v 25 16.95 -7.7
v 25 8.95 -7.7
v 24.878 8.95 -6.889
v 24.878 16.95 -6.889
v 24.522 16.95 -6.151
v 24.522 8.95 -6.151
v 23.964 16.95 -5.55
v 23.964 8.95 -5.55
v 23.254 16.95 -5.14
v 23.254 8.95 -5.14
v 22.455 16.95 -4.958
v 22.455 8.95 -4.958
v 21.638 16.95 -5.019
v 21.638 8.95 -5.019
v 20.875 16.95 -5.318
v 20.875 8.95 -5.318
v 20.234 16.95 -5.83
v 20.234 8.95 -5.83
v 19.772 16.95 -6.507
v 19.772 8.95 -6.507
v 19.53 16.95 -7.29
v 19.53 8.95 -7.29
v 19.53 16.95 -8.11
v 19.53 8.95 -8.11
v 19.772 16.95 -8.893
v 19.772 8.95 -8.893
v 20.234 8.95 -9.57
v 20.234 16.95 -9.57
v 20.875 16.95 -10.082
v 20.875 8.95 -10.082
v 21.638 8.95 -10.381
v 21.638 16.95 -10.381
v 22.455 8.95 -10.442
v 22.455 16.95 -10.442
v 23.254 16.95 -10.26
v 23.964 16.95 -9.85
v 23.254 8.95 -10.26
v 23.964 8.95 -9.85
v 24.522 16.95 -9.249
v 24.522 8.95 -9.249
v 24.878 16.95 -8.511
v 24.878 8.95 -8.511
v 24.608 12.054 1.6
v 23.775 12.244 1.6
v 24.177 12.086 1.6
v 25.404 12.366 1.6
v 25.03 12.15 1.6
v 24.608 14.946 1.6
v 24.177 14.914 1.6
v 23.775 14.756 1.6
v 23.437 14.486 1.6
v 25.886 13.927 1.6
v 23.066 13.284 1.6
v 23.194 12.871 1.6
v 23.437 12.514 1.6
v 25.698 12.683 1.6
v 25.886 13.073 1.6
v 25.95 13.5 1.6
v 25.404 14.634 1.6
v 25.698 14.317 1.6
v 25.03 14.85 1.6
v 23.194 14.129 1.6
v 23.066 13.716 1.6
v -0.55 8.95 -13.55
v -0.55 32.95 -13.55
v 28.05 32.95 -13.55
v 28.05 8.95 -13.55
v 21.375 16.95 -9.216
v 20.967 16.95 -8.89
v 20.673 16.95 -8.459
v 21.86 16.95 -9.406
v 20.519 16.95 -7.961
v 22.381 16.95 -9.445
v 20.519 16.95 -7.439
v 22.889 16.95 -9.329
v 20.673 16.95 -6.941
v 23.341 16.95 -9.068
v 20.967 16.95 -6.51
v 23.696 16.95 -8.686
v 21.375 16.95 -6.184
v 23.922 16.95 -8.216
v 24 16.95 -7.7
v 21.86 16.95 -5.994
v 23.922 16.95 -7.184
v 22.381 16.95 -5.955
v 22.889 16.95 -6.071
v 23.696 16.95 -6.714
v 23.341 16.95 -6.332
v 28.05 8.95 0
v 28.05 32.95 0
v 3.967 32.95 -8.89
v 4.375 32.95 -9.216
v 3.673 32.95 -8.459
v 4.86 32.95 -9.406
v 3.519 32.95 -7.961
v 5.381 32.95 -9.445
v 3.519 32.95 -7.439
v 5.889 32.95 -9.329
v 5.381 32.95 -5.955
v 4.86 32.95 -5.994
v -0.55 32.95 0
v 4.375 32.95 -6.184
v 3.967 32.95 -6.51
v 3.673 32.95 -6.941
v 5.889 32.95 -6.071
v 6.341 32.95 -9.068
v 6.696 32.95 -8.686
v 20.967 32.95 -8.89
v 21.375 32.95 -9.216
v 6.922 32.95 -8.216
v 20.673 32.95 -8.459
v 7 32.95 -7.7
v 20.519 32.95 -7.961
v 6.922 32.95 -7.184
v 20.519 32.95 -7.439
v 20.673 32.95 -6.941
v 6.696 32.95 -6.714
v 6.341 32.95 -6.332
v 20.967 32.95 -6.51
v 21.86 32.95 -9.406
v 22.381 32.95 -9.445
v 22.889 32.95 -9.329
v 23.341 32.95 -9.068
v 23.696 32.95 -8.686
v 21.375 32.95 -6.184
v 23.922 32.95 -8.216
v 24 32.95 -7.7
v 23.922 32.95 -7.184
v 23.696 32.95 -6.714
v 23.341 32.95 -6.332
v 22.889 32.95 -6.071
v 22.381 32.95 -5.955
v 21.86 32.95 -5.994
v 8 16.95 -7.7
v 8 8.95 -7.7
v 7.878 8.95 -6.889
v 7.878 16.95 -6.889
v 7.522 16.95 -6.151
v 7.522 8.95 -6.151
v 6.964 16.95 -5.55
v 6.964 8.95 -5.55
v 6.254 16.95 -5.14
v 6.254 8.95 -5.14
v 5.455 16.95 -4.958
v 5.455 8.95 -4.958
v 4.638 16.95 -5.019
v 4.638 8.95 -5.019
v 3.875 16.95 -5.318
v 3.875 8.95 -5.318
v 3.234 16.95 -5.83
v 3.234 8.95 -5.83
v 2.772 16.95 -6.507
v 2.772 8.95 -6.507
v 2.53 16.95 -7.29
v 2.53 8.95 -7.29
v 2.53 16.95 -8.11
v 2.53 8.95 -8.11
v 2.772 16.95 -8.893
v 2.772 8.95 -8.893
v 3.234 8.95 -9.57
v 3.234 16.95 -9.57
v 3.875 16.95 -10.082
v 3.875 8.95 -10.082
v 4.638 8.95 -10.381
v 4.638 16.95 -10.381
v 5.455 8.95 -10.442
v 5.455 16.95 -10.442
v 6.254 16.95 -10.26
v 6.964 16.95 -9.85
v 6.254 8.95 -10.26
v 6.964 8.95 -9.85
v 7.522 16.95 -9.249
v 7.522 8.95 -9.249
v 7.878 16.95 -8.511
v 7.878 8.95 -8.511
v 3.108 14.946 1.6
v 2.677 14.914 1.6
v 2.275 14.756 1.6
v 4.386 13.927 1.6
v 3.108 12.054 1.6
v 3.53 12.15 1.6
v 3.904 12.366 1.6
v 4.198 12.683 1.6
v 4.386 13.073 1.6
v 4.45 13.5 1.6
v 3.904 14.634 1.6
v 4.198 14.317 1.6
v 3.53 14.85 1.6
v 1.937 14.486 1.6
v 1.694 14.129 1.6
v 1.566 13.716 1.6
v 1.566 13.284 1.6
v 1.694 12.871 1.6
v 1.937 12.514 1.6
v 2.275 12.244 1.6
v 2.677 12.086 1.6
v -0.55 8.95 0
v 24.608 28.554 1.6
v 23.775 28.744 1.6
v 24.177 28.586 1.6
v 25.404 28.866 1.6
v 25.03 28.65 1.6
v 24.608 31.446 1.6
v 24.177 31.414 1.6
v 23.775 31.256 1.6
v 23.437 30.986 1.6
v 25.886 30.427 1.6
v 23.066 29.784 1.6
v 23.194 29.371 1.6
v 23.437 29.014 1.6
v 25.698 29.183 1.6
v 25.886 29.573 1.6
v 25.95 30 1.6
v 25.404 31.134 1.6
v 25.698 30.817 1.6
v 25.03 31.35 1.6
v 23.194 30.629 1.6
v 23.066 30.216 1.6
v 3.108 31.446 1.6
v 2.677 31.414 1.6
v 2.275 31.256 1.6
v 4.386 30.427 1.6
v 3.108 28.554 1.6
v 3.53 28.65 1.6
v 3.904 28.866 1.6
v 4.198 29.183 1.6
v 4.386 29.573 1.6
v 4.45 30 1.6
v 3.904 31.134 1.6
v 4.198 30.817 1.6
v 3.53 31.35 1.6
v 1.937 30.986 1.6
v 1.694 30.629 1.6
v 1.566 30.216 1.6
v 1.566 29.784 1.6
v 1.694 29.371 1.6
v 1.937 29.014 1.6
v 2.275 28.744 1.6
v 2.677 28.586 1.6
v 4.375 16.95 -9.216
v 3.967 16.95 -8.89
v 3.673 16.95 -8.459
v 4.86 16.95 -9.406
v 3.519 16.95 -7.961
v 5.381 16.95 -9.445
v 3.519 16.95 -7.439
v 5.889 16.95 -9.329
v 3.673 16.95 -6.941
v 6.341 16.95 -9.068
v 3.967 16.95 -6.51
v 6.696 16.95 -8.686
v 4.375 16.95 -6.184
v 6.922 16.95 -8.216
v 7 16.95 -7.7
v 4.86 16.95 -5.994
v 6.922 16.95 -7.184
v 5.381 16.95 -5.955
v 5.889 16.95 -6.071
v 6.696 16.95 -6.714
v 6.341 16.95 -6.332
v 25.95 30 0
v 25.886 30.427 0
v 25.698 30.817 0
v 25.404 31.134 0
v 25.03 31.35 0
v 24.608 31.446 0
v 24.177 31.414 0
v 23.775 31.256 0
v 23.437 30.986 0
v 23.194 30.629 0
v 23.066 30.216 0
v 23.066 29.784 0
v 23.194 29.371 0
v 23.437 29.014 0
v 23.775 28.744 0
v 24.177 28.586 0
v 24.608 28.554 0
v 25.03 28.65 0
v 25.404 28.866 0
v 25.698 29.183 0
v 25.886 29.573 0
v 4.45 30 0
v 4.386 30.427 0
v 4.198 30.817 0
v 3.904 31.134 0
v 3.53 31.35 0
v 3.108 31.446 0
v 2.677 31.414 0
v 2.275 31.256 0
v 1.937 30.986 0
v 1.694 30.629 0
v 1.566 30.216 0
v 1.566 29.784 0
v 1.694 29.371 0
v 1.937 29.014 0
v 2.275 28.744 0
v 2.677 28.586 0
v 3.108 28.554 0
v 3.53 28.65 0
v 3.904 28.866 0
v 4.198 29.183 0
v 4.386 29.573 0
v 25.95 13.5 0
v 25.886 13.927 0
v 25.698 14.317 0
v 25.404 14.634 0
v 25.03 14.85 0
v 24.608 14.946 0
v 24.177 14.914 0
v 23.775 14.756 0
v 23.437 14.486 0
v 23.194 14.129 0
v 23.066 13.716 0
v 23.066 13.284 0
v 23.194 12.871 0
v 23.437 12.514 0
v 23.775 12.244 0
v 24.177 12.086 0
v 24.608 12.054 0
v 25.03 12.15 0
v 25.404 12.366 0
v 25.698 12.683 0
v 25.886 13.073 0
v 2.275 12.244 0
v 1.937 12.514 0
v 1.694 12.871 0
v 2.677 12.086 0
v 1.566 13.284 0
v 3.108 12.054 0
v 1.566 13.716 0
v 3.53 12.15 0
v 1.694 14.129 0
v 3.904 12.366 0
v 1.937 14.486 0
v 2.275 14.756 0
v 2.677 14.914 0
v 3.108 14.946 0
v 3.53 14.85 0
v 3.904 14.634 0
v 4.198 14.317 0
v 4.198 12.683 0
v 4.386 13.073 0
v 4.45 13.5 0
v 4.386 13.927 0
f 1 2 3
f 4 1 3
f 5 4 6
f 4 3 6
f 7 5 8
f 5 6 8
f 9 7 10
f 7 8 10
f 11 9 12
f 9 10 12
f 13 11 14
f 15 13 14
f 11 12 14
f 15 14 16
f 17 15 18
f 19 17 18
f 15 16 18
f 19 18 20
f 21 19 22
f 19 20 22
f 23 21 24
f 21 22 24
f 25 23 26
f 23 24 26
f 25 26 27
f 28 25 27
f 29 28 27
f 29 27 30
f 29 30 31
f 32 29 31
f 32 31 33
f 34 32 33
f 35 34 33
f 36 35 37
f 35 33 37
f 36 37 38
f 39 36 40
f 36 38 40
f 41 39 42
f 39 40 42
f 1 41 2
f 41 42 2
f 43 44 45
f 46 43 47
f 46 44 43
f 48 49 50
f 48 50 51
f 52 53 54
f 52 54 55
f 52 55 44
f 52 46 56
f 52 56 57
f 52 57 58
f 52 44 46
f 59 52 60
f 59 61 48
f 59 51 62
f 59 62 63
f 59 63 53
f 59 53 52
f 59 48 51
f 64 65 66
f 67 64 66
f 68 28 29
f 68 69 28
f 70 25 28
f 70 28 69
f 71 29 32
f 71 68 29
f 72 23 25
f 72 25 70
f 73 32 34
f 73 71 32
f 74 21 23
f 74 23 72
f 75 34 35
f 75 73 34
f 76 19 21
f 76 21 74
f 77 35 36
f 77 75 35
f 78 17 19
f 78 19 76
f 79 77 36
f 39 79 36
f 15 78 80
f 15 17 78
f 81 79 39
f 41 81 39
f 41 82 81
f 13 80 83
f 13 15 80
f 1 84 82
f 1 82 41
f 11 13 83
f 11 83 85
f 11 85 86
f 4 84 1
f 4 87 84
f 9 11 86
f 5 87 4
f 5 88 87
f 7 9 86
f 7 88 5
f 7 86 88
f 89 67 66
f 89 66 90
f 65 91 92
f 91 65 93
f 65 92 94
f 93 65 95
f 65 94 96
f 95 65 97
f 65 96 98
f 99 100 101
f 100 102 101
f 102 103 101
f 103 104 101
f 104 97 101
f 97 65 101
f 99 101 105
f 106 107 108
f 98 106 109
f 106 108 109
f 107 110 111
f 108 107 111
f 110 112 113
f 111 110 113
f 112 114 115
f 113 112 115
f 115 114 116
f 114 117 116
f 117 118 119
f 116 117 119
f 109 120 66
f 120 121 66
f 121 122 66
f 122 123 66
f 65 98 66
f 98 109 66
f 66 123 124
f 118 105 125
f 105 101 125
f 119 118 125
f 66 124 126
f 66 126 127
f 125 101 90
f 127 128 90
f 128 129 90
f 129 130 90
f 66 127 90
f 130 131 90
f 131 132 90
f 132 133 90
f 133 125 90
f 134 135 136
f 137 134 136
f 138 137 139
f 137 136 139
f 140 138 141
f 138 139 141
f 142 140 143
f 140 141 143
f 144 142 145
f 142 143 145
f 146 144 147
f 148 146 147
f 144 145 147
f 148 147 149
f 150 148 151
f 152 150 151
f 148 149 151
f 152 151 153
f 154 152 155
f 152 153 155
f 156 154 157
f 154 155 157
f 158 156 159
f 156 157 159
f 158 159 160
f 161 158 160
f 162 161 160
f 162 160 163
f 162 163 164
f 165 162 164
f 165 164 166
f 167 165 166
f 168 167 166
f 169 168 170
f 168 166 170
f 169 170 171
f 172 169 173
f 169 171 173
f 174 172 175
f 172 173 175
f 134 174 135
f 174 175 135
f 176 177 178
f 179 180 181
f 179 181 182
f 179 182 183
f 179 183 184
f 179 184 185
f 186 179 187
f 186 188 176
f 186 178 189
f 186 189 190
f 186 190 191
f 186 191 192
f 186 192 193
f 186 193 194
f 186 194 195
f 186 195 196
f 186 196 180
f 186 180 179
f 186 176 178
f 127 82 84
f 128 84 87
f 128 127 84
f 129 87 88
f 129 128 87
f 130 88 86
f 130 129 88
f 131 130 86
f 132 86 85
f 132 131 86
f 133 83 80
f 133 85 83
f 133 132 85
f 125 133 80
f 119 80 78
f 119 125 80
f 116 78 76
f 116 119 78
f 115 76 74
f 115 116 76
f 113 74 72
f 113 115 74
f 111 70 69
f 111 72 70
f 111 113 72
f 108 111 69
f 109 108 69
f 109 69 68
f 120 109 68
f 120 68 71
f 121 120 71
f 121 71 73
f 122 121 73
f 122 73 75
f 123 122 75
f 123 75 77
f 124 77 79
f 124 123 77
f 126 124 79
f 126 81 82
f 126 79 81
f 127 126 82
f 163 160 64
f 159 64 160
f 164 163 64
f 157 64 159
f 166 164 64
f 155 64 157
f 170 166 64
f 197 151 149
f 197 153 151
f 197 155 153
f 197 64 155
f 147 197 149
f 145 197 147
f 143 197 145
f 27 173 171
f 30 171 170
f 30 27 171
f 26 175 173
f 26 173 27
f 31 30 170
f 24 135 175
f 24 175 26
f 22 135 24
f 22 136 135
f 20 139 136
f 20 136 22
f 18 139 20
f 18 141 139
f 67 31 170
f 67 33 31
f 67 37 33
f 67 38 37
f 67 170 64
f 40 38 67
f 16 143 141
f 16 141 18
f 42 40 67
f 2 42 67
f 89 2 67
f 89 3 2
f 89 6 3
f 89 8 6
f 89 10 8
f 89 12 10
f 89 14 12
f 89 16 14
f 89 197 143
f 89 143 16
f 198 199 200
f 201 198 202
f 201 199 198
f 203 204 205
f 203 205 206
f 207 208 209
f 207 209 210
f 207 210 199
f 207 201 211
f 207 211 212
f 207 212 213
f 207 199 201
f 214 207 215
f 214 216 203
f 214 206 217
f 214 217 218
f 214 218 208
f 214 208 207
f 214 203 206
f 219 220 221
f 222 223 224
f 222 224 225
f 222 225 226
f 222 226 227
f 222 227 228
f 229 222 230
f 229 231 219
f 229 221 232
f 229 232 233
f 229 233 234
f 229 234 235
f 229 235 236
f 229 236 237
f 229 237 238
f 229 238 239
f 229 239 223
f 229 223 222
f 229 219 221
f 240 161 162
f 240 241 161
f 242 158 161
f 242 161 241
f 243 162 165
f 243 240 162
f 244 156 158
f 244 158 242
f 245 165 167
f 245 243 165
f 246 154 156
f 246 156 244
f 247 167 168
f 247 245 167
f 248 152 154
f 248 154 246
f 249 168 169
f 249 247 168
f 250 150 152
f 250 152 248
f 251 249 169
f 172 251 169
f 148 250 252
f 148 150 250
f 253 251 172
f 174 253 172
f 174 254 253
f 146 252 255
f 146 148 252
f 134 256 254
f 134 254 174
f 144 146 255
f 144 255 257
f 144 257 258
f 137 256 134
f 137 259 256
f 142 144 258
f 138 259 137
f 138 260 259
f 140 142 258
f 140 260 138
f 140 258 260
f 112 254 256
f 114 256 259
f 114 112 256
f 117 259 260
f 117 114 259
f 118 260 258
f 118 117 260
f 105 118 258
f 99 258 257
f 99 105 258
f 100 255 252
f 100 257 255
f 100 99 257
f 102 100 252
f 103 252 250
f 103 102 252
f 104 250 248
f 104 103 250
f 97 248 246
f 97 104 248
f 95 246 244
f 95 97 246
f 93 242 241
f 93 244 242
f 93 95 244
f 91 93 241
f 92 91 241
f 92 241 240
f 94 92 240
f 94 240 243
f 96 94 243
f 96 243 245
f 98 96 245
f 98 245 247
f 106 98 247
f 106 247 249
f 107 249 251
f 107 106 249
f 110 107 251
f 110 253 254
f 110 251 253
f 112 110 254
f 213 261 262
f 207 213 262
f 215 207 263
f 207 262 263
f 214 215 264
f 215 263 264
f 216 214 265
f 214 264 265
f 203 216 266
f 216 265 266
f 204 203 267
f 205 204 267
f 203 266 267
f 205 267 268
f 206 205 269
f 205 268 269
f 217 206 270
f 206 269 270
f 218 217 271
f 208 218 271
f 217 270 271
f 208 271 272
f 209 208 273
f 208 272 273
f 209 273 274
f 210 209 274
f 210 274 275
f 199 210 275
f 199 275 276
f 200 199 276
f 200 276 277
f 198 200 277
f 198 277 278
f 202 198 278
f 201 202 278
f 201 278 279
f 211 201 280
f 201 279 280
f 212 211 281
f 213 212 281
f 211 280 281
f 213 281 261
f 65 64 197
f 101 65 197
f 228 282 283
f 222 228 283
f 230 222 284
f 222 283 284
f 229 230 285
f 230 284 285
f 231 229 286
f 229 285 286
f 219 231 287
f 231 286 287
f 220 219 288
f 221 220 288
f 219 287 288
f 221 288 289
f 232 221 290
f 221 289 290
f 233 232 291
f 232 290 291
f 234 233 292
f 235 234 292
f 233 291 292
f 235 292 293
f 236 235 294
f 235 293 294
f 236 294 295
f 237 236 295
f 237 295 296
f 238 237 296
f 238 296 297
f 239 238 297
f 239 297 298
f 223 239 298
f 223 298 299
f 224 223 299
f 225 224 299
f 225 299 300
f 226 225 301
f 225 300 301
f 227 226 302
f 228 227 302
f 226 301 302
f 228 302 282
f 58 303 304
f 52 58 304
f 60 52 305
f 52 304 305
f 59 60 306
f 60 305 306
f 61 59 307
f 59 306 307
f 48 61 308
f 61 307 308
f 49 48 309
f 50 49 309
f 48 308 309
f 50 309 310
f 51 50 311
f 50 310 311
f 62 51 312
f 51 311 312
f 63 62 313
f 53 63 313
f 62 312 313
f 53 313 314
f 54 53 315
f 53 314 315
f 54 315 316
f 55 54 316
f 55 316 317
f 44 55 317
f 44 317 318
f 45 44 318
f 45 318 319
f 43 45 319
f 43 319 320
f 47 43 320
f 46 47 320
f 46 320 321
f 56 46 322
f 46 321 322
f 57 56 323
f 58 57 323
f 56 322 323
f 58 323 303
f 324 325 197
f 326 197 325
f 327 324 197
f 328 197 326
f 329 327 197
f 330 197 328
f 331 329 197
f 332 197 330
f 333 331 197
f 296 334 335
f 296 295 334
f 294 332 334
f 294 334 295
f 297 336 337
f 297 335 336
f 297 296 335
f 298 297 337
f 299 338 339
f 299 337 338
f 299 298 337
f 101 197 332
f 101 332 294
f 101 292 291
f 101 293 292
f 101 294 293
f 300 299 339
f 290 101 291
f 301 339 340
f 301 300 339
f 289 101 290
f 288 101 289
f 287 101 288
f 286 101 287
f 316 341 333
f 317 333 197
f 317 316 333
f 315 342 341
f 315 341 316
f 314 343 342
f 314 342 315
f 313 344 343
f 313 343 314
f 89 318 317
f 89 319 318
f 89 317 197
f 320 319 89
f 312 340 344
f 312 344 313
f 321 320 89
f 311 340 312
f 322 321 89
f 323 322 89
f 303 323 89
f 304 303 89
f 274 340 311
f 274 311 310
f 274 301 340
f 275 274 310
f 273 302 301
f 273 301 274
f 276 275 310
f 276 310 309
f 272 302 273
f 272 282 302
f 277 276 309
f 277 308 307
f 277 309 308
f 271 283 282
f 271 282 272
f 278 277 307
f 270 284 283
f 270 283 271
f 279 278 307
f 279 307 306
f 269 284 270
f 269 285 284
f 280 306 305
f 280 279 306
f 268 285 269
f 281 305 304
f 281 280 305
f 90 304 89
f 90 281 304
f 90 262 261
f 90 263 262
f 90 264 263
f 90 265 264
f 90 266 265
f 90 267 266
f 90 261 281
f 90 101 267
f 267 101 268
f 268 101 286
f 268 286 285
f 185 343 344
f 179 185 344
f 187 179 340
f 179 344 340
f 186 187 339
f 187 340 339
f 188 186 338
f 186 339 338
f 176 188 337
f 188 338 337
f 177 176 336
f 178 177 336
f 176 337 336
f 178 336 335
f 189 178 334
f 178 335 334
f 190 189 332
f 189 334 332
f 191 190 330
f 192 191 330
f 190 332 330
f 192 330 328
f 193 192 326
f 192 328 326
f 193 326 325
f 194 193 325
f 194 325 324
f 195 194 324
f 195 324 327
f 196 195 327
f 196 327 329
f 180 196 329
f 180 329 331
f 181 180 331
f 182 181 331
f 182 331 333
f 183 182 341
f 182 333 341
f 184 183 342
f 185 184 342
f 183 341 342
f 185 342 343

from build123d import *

# Parameters (mm, degrees)
SKETCH015_W     = 28.6
SKETCH015_H     = 13.55
SKETCH015_R     = 1.75
PAD007_DEPTH    = 24
SKETCH016_R     = 2.75
POCKET008_DEPTH = 8
SKETCH017_R     = 1.45
PAD008_DEPTH    = 1.6


with BuildPart() as part:
    # Sketch015 (on Face21 of Binder004) → Pad007 (new body)
    with BuildSketch(Plane.XZ.offset(-32.95)):
        with Locations((13.74978, -6.775)):
            Rectangle(SKETCH015_W, SKETCH015_H)
        with Locations((5.24978, -7.7)):
            Circle(SKETCH015_R, mode=Mode.SUBTRACT)
        with Locations((22.24978, -7.7)):
            Circle(SKETCH015_R, mode=Mode.SUBTRACT)
    extrude(amount=PAD007_DEPTH)

    # Sketch016 (on Face8 of Pad007) → Pocket008 (cut)
    with BuildSketch(Plane.XZ.offset(-8.95)):
        with Locations((5.24978, -7.7)):
            Circle(SKETCH016_R)
        with Locations((22.24978, -7.7)):
            Circle(SKETCH016_R)
    extrude(amount=-POCKET008_DEPTH, mode=Mode.SUBTRACT)

    # Sketch017 (on Face6 of Pocket008) → Pad008 (join)
    with BuildSketch(Plane.XY):
        with Locations((3, 13.5)):
            Circle(SKETCH017_R)
        with Locations((24.5, 13.5)):
            Circle(SKETCH017_R)
        with Locations((24.5, 30)):
            Circle(SKETCH017_R)
        with Locations((3, 30)):
            Circle(SKETCH017_R)
    extrude(amount=PAD008_DEPTH)


solid = part.part
